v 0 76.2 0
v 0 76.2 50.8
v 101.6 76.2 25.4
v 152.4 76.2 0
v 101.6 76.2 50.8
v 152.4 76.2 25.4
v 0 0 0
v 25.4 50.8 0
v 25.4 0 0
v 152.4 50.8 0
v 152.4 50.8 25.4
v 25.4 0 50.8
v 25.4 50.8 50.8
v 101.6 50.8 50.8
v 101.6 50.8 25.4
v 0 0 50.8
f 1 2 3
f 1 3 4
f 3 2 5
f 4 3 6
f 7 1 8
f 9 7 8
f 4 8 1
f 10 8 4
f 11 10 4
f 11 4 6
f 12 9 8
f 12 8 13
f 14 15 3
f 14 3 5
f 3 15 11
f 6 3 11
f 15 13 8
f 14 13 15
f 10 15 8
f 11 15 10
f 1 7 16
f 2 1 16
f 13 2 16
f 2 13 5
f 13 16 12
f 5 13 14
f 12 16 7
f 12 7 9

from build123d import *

# Parameters (mm, degrees)
F0_W     = 152.4
F0_H     = 50.8
F1_DEPTH = 76.2
F2_W     = 127
F2_H     = 50.8
F3_DEPTH = 50.8
F4_W     = 50.8
F4_H     = 25.4
F5_DEPTH = 76.2


with BuildPart() as f1:
    # F0 (on Front) → F1 (new body)
    with BuildSketch(Plane.XZ):
        with Locations((76.2, 25.4)):
            Rectangle(F0_W, F0_H)
    extrude(amount=-F1_DEPTH)

    # F2 (on Front) → F3 (cut)
    with BuildSketch(Plane.XZ):
        with Locations((88.9, 25.4)):
            Rectangle(F2_W, F2_H)
    extrude(amount=-F3_DEPTH, mode=Mode.SUBTRACT)

    # F4 (on Front) → F5 (cut)
    with BuildSketch(Plane.XZ):
        with Locations((127, 38.1)):
            Rectangle(F4_W, F4_H)
    extrude(amount=-F5_DEPTH, mode=Mode.SUBTRACT)


solid = f1.part
